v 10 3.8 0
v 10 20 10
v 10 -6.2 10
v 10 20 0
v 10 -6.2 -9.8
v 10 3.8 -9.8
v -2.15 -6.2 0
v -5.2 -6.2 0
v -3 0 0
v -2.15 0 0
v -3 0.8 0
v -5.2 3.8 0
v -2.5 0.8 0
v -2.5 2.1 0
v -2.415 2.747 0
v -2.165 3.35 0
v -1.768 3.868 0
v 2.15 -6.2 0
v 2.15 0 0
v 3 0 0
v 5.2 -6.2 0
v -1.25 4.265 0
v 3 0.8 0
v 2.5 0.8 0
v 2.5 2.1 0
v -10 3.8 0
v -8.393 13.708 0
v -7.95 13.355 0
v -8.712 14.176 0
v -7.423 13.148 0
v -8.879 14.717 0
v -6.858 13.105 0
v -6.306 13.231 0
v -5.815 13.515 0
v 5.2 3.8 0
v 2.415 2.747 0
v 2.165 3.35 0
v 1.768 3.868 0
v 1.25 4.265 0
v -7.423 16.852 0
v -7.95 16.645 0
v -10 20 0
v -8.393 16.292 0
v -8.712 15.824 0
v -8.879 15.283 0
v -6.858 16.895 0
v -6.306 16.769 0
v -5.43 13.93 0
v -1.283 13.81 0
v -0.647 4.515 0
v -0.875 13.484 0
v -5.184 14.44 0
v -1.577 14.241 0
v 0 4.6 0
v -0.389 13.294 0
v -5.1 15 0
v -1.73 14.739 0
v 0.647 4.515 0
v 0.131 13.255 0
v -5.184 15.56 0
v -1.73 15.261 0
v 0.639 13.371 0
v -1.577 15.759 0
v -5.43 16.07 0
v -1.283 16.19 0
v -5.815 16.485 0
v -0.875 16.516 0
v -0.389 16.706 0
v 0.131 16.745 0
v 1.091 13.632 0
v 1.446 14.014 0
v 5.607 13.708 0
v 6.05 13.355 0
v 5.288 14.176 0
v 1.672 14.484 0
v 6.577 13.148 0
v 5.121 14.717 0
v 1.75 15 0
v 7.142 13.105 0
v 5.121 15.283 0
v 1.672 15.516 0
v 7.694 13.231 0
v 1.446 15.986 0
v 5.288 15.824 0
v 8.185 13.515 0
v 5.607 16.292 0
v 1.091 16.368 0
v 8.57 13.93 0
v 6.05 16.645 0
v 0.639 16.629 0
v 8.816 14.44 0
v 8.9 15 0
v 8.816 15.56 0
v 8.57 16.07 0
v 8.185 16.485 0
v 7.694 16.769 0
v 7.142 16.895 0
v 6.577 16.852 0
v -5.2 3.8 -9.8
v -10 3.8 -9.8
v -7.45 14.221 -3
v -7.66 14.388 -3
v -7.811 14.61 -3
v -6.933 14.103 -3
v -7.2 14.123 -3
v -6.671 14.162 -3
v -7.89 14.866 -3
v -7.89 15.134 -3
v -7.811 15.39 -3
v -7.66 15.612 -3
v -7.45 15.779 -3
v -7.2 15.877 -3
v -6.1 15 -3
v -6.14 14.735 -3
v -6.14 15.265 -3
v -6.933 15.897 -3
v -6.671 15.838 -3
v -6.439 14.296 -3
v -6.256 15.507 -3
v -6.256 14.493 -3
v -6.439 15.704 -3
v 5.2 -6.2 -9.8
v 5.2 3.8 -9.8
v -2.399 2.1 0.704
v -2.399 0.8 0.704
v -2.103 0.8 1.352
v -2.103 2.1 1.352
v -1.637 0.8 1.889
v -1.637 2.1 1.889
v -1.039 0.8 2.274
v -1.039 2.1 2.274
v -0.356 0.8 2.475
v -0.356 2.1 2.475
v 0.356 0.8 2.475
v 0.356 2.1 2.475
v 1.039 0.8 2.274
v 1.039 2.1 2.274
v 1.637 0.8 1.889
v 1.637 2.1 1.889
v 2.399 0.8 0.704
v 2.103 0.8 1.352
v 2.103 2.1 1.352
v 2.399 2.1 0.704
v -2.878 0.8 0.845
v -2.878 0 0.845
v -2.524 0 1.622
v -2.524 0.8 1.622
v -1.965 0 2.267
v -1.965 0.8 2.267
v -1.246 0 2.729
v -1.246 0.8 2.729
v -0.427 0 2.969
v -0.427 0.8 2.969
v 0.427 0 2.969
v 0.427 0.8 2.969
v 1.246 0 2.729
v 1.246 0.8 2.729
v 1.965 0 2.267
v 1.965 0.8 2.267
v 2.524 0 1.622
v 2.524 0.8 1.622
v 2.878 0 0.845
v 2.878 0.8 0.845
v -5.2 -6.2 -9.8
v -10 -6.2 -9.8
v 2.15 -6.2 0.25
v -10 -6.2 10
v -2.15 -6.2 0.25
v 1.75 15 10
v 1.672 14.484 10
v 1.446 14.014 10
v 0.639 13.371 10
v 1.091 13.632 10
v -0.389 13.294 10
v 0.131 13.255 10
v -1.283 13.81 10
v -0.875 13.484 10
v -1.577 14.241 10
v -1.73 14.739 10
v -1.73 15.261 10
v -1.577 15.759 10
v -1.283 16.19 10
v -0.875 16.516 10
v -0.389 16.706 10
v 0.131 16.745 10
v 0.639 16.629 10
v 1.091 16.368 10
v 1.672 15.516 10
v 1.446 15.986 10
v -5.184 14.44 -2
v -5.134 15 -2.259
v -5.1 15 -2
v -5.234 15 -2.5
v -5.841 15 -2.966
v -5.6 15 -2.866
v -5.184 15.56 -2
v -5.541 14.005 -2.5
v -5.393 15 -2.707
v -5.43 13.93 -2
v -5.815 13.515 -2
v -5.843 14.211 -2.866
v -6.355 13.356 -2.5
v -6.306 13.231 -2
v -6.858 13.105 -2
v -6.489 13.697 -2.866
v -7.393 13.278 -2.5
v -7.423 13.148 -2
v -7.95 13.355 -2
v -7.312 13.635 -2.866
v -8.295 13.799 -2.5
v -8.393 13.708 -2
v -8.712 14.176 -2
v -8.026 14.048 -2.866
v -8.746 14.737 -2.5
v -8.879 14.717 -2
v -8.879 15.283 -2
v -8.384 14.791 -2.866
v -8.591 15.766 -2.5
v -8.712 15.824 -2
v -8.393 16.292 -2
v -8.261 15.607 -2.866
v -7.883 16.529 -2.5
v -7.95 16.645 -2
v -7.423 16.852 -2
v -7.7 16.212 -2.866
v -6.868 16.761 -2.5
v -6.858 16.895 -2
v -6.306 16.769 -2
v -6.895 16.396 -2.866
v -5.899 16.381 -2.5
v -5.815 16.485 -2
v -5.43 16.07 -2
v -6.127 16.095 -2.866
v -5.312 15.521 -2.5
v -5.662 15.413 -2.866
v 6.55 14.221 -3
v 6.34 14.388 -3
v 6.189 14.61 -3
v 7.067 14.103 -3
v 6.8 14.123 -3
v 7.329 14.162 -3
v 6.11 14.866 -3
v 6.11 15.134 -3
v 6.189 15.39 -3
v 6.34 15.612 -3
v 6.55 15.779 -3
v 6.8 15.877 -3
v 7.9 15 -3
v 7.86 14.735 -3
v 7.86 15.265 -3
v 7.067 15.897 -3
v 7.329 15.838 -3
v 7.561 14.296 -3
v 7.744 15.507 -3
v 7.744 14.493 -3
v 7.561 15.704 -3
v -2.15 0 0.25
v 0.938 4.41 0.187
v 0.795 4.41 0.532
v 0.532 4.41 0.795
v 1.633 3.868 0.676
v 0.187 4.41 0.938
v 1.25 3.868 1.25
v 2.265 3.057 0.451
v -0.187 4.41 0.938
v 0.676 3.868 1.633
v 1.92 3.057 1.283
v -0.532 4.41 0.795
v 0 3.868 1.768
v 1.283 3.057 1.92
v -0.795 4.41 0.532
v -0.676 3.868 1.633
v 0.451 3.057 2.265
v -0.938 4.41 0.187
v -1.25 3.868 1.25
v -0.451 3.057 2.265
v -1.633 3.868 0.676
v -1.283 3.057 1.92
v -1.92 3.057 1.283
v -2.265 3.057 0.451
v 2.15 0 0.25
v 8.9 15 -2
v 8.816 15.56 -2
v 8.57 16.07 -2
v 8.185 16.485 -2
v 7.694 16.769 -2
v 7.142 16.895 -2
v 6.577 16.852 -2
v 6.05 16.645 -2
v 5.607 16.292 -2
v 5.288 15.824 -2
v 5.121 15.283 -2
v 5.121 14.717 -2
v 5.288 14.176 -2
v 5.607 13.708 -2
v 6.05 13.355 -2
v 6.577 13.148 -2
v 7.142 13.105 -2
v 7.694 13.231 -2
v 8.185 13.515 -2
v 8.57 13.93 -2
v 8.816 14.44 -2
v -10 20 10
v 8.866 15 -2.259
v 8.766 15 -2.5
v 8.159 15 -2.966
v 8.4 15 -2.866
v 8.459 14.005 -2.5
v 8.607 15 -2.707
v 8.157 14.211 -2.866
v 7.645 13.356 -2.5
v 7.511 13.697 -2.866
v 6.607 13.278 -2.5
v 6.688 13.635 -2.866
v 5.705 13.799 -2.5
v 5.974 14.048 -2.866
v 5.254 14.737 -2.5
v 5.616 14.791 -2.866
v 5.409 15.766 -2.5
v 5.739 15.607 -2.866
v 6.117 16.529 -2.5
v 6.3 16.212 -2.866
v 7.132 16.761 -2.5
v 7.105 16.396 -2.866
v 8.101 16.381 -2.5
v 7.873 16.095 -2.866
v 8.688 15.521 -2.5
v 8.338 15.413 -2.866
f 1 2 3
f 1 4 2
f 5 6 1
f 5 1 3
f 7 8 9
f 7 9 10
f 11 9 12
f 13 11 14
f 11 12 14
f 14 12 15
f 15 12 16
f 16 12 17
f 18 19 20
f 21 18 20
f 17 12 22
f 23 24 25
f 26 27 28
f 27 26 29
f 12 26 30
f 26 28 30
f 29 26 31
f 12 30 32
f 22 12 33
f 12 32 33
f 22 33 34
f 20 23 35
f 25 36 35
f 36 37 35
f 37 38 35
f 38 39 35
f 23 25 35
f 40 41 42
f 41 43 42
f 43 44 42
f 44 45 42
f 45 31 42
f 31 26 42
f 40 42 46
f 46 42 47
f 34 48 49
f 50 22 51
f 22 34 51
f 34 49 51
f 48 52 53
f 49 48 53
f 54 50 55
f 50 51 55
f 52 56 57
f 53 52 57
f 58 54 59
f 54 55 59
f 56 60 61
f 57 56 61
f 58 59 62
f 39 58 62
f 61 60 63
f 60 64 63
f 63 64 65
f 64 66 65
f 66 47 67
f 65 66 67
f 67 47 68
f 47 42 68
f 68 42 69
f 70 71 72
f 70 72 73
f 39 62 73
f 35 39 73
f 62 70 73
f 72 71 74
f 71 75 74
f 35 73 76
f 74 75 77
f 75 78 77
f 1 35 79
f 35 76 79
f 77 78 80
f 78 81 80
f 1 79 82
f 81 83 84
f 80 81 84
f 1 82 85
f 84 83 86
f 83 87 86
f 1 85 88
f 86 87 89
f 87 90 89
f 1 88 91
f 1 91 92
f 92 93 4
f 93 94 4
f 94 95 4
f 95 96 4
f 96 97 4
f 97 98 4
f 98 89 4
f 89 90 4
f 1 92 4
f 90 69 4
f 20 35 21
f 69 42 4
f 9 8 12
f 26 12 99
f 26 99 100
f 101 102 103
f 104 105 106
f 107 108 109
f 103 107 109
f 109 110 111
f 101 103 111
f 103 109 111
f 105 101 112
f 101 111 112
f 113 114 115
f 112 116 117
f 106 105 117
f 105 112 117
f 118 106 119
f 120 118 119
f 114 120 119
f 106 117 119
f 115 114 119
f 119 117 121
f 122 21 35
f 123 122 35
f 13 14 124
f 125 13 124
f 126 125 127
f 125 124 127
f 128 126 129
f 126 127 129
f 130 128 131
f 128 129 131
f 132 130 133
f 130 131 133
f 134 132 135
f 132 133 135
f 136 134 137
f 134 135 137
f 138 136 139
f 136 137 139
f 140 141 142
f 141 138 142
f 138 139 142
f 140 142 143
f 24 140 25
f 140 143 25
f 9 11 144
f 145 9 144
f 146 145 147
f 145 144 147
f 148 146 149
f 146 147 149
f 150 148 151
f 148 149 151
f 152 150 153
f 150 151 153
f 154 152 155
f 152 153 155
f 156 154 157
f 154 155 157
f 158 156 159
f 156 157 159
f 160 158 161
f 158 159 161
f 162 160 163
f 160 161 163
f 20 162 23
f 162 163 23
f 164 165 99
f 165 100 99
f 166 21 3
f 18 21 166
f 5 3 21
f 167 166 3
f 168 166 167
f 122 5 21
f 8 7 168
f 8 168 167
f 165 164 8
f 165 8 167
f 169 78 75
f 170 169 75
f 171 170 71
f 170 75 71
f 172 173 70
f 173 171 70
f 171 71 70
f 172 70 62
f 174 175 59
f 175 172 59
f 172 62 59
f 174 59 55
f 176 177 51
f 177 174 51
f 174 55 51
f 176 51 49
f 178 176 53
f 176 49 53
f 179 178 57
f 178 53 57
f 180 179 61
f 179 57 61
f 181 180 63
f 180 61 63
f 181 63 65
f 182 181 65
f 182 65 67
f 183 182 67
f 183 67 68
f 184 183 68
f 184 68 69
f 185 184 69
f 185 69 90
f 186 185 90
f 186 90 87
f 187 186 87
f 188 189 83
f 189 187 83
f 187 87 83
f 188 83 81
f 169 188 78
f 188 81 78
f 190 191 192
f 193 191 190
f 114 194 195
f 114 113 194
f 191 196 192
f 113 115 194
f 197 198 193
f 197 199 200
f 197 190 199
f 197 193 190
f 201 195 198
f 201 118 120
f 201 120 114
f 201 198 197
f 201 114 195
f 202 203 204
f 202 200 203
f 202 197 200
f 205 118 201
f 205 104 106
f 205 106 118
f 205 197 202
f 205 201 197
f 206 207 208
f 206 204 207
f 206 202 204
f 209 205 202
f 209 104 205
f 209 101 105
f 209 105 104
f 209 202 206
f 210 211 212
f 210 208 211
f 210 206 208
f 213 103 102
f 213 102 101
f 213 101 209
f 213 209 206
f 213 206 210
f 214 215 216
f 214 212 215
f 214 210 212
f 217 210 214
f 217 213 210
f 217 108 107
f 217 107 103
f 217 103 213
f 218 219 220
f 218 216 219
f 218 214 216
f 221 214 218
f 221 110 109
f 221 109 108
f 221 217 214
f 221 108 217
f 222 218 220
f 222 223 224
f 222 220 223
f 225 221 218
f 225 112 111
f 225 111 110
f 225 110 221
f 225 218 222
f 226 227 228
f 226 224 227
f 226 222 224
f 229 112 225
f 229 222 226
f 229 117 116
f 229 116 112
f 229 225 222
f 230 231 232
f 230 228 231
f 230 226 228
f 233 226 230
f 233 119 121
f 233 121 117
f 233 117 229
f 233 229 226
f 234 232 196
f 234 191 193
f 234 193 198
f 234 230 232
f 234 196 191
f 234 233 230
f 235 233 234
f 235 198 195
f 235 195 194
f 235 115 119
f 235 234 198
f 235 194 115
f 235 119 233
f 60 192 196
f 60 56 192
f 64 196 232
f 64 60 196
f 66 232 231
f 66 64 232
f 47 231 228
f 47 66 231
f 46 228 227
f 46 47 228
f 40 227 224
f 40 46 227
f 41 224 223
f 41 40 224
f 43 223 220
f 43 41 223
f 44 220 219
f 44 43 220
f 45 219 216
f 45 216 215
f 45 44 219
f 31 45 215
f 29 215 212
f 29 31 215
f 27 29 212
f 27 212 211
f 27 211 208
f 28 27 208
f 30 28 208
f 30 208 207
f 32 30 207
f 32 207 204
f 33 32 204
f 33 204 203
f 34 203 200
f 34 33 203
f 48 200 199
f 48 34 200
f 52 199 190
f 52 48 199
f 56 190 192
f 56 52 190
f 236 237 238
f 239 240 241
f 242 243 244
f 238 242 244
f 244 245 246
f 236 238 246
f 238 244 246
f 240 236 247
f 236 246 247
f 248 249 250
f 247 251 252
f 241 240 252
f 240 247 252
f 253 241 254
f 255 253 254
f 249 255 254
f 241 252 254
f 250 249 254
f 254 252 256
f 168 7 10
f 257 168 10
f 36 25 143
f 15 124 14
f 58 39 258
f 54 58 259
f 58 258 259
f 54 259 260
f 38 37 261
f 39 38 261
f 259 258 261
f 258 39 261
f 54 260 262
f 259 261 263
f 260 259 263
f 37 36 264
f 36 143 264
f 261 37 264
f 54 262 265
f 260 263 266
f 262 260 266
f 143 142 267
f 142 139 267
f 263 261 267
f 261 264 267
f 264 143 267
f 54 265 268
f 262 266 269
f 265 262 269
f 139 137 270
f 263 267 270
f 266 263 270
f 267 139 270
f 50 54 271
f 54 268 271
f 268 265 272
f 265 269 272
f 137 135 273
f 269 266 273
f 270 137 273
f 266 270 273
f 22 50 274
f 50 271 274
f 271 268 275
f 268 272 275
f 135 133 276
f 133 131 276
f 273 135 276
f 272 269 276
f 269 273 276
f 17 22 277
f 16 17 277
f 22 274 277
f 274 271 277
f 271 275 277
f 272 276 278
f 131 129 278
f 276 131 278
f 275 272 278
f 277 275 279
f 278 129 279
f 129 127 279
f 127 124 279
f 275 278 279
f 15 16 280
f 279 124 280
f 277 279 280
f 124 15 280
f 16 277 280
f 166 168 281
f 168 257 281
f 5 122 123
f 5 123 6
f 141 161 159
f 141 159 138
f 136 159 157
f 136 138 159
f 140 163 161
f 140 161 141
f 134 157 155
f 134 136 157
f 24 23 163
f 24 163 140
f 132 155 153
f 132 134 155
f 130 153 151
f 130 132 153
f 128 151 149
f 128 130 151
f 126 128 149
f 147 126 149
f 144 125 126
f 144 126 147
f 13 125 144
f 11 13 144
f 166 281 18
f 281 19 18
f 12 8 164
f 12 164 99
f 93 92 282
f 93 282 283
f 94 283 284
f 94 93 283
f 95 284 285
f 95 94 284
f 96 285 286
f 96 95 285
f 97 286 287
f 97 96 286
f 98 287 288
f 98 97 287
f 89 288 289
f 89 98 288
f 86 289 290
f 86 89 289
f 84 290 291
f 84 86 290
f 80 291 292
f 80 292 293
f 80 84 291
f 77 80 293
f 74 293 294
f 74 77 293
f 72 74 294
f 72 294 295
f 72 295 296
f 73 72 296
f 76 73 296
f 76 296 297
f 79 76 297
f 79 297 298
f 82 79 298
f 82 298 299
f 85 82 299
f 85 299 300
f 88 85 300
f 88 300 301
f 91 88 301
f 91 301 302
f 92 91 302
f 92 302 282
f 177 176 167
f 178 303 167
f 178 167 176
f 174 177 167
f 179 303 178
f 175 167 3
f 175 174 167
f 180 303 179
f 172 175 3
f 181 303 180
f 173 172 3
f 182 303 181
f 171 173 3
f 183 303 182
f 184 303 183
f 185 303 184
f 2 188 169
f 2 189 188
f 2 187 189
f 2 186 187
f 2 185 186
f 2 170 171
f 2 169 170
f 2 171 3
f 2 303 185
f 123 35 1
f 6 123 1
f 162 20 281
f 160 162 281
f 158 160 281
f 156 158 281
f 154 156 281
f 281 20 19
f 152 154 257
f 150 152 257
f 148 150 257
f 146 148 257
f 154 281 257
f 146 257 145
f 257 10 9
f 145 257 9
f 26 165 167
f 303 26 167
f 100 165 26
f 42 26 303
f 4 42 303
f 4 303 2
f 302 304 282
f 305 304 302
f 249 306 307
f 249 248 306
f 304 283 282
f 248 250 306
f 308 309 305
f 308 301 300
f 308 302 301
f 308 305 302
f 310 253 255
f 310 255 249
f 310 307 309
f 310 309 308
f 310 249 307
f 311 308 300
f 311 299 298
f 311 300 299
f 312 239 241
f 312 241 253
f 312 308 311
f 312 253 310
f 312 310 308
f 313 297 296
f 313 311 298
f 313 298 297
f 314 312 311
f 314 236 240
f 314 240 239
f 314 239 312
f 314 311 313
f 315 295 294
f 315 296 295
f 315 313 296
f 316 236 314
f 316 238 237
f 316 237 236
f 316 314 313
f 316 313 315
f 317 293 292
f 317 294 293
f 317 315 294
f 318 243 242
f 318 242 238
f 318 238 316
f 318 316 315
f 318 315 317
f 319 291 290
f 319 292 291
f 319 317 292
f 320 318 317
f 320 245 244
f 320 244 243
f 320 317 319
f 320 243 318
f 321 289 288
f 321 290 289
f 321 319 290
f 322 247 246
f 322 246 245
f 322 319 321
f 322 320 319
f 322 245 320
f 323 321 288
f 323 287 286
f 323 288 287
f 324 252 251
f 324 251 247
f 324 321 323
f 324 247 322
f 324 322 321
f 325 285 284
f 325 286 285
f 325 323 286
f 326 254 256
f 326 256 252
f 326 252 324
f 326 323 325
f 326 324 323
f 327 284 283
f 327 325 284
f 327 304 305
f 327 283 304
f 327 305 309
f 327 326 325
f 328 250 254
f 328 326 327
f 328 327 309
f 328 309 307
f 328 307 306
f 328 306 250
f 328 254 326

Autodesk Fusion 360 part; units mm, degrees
sketch "Skizze1" plane through (0, 0, 0) normal (0, 0, 1) x (1, 0, 0)
  line L0 (-3, 0) -> (-3, 0.8)
  line L1 (-3, 0.8) -> (-2.5, 0.8)
  line L2 (-2.5, 0.8) -> (-2.5, 2.1)
  line L3 (-8.4843, 2.1) -> (11.6981, 2.1) construction
  line L4 (0, 9) -> (0, -6.2163) construction
  arc A0 (0, 4.6) -> (-2.5, 2.1) centre (0, 2.1) ccw
  line L5 (0, 4.6) -> (0, 0)
  line L6 (0, 0) -> (-3, 0)
  line L7 (2.5, 2) -> (4.5, 2)
  line L8 (4.5, 2) -> (4.5, -2)
  line L9 (4.5, -2) -> (2.5, -2)
  line L10 (2.5, -2) -> (2.5, 2)
  line L11 (-2.5, -2) -> (-4.5, -2)
  line L12 (-4.5, -2) -> (-4.5, 2)
  line L13 (-4.5, 2) -> (-2.5, 2)
  line L14 (-2.5, 2) -> (-2.5, -2)
  point P0 (0, 2.1)
  dimension "d1" = 3
  dimension "d2" = 0.8
  dimension "d3" = 2.5
  dimension "d5" = 2.1
  dimension "d7" = 2.5
  dimension "d8" = 2
  dimension "d9" = 2
  dimension "d10" = 2
  dimension "d126" = 2
  dimension "d127" = 2
  dimension "d128" = 2
  dimension "d129" = 2.5
revolve "Drehen1" add sketch "Skizze1" angle 360 about axis through (0, 9, 0) along (0, -1, 0) contours L0 L1 L6 L14 | L2 A0 L5 L6 L14 makes body 1
sketch "Skizze2" plane through (0, 0, 0) normal (0, 0, 1) x (1, 0, 0)
  line L0 (-10, 20) -> (10, 20)
  line L1 (10, 20) -> (10, -6.2)
  line L2 (10, -6.2) -> (-10, -6.2)
  line L3 (-10, -6.2) -> (-10, 20)
  line L4 (0, 21.3723) -> (0, -17) construction
  line L5 (-26.2349, 0) -> (38.3962, 0) construction
  line L6 (5.2, -6.2) -> (5.2, 3.8)
  line L7 (5.2, 3.8) -> (10, 3.8)
  line L8 (-5.2, -6.2) -> (-5.2, 3.8)
  line L9 (-5.2, 3.8) -> (-10, 3.8)
  line L10 (-17, 10) -> (24.4562, 10) construction
  line L11 (-5, 26) -> (-5, 5) construction
  line L12 (5, 25.6741) -> (5, 5) construction
  circle A0 centre (-5, 10) radius 1.75
  circle A1 centre (5, 10) radius 1.75
  line L13 (-16, 15) -> (36.57, 15) construction
  circle A2 centre (0, 15) radius 1.75
  line L14 (-7, 22.2425) -> (-7, -4.6464) construction
  line L15 (7, 22.2425) -> (7, -3.3633) construction
  circle A3 centre (7, 15) radius 1.9
  circle A4 centre (-7, 15) radius 1.9
  dimension "d13" = 10
  dimension "d14" = 10
  dimension "d15" = 6.2
  dimension "d16" = 20
  dimension "d32" = 4.8
  dimension "d33" = 10
  dimension "d34" = 4.8
  dimension "d35" = 10
  dimension "d36" = 10
  dimension "d37" = 5
  dimension "d38" = 5
  dimension "d39" = 3.5
  dimension "d40" = 3.5
  dimension "d41" = 5
  dimension "d42" = 3.5
  dimension "d53" = 7
  dimension "d54" = 7
  dimension "d117" = 3.8
  dimension "d118" = 3.8
extrude "Extrusion2" add sketch "Skizze2" along normal blind 10 separate body contours L0 L1 L2 L3 L6 L7 L8 L9 | L2 L3 L8 L9 | L1 L2 L6 L7 | A0 | A1 | A3 | A4 makes body 2
extrude "Extrusion7" add sketch "Skizze2" against normal blind 3 contours A3 | A4 bodies 2
extrude "Extrusion8" add sketch "Skizze2" against normal blind 9.8 contours L2 L3 L8 L9 | L1 L2 L6 L7 bodies 2
combine "Kombinieren1" operation cut target body 2 tool bodies 1
sketch "Skizze4" plane through (0, 0, 0) normal (0, 0, 1) x (1, 0, 0)
  line L0 (2.15, -6.2) -> (-2.15, -6.2)
  line L1 (-2.15, -6.2) -> (-2.15, 0)
  line L2 (-2.15, 0) -> (2.15, 0)
  line L3 (2.15, 0) -> (2.15, -6.2)
  line L4 (2.15, -6.2) -> (-2.15, 0) construction
  line L5 (-2.15, -6.2) -> (2.15, 0) construction
  line L6 (0, 9.7025) -> (0, -8.7035) construction
  line L7 (-7.2352, -6.2) -> (6.1757, -6.2) construction
  point P0 (0, -3.1)
  point P1 (0, -6.2)
  dimension "d21" = 4.3
  dimension "d22" = 6.2
extrude "Extrusion4" cut sketch "Skizze4" along normal blind 0.25 bodies 2
fillet "Abrundung1" radius 1 1 edges at (-8.7714, 15.6871, -3) on bodies 2
fillet "Abrundung2" radius 1 1 edges at (5.2286, 15.6871, -3) on bodies 2
equation "d3 = d"
equation "d5 = 4.6 mm - d"
equation "d7 = d"
equation "d = 2.5 mm"
equation "d129 = d"
